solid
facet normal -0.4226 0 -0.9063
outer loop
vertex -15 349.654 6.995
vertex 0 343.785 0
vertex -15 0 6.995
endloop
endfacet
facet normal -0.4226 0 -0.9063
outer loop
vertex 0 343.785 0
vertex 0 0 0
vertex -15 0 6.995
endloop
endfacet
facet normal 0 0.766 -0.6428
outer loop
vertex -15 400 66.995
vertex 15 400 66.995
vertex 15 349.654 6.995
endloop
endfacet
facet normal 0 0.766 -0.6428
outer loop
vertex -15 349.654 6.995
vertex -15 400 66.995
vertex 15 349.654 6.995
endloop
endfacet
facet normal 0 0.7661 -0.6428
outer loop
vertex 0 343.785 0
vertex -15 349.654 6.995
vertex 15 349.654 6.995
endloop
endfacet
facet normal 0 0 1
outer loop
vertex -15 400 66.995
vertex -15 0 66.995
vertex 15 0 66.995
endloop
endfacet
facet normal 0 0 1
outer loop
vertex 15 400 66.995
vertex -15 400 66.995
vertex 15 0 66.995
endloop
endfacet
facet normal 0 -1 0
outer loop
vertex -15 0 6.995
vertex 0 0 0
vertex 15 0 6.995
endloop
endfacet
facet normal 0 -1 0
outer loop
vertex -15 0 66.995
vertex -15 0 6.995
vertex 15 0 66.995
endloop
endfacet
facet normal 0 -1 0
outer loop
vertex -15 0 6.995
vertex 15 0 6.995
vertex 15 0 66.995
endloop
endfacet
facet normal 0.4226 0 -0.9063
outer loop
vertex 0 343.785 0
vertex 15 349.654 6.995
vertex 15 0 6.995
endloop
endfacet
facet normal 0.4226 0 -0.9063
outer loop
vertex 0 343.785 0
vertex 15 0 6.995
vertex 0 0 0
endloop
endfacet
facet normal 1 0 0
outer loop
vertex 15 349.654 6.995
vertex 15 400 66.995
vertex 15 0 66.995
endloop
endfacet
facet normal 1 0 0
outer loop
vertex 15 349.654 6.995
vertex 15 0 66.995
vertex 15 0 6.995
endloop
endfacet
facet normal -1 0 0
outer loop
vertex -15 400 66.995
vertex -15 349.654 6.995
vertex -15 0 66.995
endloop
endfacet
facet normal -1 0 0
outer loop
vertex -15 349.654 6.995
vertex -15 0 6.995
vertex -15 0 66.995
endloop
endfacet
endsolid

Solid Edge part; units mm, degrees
sketch "Sketch1" plane through (0, 0, 0) normal (0, -1, 0) x (1, 0, 0)
  line L0 (15, 66.9946) -> (15, 6.9946)
  line L1 (15, 6.9946) -> (0, 0)
  line L2 (0, 0) -> (-15, 6.9946)
  line L3 (-15, 6.9946) -> (-15, 66.9946)
  line L4 (-15, 66.9946) -> (15, 66.9946)
extrude "Protrusion1" add sketch "Sketch1" against normal blind 400
sketch "Sketch2" plane through (15, 35, 21.0229) normal (1, 0, 0) x (0, 1, 0)
  line L0 (365, 45.9717) -> (308.7848, -21.0229)
  line L1 (308.7848, -21.0229) -> (365, -21.0229)
  line L2 (365, -21.0229) -> (365, 45.9717)
extrude "Cutout1" cut sketch "Sketch2" against normal up to next
properties material "ABS 20% Infill"
